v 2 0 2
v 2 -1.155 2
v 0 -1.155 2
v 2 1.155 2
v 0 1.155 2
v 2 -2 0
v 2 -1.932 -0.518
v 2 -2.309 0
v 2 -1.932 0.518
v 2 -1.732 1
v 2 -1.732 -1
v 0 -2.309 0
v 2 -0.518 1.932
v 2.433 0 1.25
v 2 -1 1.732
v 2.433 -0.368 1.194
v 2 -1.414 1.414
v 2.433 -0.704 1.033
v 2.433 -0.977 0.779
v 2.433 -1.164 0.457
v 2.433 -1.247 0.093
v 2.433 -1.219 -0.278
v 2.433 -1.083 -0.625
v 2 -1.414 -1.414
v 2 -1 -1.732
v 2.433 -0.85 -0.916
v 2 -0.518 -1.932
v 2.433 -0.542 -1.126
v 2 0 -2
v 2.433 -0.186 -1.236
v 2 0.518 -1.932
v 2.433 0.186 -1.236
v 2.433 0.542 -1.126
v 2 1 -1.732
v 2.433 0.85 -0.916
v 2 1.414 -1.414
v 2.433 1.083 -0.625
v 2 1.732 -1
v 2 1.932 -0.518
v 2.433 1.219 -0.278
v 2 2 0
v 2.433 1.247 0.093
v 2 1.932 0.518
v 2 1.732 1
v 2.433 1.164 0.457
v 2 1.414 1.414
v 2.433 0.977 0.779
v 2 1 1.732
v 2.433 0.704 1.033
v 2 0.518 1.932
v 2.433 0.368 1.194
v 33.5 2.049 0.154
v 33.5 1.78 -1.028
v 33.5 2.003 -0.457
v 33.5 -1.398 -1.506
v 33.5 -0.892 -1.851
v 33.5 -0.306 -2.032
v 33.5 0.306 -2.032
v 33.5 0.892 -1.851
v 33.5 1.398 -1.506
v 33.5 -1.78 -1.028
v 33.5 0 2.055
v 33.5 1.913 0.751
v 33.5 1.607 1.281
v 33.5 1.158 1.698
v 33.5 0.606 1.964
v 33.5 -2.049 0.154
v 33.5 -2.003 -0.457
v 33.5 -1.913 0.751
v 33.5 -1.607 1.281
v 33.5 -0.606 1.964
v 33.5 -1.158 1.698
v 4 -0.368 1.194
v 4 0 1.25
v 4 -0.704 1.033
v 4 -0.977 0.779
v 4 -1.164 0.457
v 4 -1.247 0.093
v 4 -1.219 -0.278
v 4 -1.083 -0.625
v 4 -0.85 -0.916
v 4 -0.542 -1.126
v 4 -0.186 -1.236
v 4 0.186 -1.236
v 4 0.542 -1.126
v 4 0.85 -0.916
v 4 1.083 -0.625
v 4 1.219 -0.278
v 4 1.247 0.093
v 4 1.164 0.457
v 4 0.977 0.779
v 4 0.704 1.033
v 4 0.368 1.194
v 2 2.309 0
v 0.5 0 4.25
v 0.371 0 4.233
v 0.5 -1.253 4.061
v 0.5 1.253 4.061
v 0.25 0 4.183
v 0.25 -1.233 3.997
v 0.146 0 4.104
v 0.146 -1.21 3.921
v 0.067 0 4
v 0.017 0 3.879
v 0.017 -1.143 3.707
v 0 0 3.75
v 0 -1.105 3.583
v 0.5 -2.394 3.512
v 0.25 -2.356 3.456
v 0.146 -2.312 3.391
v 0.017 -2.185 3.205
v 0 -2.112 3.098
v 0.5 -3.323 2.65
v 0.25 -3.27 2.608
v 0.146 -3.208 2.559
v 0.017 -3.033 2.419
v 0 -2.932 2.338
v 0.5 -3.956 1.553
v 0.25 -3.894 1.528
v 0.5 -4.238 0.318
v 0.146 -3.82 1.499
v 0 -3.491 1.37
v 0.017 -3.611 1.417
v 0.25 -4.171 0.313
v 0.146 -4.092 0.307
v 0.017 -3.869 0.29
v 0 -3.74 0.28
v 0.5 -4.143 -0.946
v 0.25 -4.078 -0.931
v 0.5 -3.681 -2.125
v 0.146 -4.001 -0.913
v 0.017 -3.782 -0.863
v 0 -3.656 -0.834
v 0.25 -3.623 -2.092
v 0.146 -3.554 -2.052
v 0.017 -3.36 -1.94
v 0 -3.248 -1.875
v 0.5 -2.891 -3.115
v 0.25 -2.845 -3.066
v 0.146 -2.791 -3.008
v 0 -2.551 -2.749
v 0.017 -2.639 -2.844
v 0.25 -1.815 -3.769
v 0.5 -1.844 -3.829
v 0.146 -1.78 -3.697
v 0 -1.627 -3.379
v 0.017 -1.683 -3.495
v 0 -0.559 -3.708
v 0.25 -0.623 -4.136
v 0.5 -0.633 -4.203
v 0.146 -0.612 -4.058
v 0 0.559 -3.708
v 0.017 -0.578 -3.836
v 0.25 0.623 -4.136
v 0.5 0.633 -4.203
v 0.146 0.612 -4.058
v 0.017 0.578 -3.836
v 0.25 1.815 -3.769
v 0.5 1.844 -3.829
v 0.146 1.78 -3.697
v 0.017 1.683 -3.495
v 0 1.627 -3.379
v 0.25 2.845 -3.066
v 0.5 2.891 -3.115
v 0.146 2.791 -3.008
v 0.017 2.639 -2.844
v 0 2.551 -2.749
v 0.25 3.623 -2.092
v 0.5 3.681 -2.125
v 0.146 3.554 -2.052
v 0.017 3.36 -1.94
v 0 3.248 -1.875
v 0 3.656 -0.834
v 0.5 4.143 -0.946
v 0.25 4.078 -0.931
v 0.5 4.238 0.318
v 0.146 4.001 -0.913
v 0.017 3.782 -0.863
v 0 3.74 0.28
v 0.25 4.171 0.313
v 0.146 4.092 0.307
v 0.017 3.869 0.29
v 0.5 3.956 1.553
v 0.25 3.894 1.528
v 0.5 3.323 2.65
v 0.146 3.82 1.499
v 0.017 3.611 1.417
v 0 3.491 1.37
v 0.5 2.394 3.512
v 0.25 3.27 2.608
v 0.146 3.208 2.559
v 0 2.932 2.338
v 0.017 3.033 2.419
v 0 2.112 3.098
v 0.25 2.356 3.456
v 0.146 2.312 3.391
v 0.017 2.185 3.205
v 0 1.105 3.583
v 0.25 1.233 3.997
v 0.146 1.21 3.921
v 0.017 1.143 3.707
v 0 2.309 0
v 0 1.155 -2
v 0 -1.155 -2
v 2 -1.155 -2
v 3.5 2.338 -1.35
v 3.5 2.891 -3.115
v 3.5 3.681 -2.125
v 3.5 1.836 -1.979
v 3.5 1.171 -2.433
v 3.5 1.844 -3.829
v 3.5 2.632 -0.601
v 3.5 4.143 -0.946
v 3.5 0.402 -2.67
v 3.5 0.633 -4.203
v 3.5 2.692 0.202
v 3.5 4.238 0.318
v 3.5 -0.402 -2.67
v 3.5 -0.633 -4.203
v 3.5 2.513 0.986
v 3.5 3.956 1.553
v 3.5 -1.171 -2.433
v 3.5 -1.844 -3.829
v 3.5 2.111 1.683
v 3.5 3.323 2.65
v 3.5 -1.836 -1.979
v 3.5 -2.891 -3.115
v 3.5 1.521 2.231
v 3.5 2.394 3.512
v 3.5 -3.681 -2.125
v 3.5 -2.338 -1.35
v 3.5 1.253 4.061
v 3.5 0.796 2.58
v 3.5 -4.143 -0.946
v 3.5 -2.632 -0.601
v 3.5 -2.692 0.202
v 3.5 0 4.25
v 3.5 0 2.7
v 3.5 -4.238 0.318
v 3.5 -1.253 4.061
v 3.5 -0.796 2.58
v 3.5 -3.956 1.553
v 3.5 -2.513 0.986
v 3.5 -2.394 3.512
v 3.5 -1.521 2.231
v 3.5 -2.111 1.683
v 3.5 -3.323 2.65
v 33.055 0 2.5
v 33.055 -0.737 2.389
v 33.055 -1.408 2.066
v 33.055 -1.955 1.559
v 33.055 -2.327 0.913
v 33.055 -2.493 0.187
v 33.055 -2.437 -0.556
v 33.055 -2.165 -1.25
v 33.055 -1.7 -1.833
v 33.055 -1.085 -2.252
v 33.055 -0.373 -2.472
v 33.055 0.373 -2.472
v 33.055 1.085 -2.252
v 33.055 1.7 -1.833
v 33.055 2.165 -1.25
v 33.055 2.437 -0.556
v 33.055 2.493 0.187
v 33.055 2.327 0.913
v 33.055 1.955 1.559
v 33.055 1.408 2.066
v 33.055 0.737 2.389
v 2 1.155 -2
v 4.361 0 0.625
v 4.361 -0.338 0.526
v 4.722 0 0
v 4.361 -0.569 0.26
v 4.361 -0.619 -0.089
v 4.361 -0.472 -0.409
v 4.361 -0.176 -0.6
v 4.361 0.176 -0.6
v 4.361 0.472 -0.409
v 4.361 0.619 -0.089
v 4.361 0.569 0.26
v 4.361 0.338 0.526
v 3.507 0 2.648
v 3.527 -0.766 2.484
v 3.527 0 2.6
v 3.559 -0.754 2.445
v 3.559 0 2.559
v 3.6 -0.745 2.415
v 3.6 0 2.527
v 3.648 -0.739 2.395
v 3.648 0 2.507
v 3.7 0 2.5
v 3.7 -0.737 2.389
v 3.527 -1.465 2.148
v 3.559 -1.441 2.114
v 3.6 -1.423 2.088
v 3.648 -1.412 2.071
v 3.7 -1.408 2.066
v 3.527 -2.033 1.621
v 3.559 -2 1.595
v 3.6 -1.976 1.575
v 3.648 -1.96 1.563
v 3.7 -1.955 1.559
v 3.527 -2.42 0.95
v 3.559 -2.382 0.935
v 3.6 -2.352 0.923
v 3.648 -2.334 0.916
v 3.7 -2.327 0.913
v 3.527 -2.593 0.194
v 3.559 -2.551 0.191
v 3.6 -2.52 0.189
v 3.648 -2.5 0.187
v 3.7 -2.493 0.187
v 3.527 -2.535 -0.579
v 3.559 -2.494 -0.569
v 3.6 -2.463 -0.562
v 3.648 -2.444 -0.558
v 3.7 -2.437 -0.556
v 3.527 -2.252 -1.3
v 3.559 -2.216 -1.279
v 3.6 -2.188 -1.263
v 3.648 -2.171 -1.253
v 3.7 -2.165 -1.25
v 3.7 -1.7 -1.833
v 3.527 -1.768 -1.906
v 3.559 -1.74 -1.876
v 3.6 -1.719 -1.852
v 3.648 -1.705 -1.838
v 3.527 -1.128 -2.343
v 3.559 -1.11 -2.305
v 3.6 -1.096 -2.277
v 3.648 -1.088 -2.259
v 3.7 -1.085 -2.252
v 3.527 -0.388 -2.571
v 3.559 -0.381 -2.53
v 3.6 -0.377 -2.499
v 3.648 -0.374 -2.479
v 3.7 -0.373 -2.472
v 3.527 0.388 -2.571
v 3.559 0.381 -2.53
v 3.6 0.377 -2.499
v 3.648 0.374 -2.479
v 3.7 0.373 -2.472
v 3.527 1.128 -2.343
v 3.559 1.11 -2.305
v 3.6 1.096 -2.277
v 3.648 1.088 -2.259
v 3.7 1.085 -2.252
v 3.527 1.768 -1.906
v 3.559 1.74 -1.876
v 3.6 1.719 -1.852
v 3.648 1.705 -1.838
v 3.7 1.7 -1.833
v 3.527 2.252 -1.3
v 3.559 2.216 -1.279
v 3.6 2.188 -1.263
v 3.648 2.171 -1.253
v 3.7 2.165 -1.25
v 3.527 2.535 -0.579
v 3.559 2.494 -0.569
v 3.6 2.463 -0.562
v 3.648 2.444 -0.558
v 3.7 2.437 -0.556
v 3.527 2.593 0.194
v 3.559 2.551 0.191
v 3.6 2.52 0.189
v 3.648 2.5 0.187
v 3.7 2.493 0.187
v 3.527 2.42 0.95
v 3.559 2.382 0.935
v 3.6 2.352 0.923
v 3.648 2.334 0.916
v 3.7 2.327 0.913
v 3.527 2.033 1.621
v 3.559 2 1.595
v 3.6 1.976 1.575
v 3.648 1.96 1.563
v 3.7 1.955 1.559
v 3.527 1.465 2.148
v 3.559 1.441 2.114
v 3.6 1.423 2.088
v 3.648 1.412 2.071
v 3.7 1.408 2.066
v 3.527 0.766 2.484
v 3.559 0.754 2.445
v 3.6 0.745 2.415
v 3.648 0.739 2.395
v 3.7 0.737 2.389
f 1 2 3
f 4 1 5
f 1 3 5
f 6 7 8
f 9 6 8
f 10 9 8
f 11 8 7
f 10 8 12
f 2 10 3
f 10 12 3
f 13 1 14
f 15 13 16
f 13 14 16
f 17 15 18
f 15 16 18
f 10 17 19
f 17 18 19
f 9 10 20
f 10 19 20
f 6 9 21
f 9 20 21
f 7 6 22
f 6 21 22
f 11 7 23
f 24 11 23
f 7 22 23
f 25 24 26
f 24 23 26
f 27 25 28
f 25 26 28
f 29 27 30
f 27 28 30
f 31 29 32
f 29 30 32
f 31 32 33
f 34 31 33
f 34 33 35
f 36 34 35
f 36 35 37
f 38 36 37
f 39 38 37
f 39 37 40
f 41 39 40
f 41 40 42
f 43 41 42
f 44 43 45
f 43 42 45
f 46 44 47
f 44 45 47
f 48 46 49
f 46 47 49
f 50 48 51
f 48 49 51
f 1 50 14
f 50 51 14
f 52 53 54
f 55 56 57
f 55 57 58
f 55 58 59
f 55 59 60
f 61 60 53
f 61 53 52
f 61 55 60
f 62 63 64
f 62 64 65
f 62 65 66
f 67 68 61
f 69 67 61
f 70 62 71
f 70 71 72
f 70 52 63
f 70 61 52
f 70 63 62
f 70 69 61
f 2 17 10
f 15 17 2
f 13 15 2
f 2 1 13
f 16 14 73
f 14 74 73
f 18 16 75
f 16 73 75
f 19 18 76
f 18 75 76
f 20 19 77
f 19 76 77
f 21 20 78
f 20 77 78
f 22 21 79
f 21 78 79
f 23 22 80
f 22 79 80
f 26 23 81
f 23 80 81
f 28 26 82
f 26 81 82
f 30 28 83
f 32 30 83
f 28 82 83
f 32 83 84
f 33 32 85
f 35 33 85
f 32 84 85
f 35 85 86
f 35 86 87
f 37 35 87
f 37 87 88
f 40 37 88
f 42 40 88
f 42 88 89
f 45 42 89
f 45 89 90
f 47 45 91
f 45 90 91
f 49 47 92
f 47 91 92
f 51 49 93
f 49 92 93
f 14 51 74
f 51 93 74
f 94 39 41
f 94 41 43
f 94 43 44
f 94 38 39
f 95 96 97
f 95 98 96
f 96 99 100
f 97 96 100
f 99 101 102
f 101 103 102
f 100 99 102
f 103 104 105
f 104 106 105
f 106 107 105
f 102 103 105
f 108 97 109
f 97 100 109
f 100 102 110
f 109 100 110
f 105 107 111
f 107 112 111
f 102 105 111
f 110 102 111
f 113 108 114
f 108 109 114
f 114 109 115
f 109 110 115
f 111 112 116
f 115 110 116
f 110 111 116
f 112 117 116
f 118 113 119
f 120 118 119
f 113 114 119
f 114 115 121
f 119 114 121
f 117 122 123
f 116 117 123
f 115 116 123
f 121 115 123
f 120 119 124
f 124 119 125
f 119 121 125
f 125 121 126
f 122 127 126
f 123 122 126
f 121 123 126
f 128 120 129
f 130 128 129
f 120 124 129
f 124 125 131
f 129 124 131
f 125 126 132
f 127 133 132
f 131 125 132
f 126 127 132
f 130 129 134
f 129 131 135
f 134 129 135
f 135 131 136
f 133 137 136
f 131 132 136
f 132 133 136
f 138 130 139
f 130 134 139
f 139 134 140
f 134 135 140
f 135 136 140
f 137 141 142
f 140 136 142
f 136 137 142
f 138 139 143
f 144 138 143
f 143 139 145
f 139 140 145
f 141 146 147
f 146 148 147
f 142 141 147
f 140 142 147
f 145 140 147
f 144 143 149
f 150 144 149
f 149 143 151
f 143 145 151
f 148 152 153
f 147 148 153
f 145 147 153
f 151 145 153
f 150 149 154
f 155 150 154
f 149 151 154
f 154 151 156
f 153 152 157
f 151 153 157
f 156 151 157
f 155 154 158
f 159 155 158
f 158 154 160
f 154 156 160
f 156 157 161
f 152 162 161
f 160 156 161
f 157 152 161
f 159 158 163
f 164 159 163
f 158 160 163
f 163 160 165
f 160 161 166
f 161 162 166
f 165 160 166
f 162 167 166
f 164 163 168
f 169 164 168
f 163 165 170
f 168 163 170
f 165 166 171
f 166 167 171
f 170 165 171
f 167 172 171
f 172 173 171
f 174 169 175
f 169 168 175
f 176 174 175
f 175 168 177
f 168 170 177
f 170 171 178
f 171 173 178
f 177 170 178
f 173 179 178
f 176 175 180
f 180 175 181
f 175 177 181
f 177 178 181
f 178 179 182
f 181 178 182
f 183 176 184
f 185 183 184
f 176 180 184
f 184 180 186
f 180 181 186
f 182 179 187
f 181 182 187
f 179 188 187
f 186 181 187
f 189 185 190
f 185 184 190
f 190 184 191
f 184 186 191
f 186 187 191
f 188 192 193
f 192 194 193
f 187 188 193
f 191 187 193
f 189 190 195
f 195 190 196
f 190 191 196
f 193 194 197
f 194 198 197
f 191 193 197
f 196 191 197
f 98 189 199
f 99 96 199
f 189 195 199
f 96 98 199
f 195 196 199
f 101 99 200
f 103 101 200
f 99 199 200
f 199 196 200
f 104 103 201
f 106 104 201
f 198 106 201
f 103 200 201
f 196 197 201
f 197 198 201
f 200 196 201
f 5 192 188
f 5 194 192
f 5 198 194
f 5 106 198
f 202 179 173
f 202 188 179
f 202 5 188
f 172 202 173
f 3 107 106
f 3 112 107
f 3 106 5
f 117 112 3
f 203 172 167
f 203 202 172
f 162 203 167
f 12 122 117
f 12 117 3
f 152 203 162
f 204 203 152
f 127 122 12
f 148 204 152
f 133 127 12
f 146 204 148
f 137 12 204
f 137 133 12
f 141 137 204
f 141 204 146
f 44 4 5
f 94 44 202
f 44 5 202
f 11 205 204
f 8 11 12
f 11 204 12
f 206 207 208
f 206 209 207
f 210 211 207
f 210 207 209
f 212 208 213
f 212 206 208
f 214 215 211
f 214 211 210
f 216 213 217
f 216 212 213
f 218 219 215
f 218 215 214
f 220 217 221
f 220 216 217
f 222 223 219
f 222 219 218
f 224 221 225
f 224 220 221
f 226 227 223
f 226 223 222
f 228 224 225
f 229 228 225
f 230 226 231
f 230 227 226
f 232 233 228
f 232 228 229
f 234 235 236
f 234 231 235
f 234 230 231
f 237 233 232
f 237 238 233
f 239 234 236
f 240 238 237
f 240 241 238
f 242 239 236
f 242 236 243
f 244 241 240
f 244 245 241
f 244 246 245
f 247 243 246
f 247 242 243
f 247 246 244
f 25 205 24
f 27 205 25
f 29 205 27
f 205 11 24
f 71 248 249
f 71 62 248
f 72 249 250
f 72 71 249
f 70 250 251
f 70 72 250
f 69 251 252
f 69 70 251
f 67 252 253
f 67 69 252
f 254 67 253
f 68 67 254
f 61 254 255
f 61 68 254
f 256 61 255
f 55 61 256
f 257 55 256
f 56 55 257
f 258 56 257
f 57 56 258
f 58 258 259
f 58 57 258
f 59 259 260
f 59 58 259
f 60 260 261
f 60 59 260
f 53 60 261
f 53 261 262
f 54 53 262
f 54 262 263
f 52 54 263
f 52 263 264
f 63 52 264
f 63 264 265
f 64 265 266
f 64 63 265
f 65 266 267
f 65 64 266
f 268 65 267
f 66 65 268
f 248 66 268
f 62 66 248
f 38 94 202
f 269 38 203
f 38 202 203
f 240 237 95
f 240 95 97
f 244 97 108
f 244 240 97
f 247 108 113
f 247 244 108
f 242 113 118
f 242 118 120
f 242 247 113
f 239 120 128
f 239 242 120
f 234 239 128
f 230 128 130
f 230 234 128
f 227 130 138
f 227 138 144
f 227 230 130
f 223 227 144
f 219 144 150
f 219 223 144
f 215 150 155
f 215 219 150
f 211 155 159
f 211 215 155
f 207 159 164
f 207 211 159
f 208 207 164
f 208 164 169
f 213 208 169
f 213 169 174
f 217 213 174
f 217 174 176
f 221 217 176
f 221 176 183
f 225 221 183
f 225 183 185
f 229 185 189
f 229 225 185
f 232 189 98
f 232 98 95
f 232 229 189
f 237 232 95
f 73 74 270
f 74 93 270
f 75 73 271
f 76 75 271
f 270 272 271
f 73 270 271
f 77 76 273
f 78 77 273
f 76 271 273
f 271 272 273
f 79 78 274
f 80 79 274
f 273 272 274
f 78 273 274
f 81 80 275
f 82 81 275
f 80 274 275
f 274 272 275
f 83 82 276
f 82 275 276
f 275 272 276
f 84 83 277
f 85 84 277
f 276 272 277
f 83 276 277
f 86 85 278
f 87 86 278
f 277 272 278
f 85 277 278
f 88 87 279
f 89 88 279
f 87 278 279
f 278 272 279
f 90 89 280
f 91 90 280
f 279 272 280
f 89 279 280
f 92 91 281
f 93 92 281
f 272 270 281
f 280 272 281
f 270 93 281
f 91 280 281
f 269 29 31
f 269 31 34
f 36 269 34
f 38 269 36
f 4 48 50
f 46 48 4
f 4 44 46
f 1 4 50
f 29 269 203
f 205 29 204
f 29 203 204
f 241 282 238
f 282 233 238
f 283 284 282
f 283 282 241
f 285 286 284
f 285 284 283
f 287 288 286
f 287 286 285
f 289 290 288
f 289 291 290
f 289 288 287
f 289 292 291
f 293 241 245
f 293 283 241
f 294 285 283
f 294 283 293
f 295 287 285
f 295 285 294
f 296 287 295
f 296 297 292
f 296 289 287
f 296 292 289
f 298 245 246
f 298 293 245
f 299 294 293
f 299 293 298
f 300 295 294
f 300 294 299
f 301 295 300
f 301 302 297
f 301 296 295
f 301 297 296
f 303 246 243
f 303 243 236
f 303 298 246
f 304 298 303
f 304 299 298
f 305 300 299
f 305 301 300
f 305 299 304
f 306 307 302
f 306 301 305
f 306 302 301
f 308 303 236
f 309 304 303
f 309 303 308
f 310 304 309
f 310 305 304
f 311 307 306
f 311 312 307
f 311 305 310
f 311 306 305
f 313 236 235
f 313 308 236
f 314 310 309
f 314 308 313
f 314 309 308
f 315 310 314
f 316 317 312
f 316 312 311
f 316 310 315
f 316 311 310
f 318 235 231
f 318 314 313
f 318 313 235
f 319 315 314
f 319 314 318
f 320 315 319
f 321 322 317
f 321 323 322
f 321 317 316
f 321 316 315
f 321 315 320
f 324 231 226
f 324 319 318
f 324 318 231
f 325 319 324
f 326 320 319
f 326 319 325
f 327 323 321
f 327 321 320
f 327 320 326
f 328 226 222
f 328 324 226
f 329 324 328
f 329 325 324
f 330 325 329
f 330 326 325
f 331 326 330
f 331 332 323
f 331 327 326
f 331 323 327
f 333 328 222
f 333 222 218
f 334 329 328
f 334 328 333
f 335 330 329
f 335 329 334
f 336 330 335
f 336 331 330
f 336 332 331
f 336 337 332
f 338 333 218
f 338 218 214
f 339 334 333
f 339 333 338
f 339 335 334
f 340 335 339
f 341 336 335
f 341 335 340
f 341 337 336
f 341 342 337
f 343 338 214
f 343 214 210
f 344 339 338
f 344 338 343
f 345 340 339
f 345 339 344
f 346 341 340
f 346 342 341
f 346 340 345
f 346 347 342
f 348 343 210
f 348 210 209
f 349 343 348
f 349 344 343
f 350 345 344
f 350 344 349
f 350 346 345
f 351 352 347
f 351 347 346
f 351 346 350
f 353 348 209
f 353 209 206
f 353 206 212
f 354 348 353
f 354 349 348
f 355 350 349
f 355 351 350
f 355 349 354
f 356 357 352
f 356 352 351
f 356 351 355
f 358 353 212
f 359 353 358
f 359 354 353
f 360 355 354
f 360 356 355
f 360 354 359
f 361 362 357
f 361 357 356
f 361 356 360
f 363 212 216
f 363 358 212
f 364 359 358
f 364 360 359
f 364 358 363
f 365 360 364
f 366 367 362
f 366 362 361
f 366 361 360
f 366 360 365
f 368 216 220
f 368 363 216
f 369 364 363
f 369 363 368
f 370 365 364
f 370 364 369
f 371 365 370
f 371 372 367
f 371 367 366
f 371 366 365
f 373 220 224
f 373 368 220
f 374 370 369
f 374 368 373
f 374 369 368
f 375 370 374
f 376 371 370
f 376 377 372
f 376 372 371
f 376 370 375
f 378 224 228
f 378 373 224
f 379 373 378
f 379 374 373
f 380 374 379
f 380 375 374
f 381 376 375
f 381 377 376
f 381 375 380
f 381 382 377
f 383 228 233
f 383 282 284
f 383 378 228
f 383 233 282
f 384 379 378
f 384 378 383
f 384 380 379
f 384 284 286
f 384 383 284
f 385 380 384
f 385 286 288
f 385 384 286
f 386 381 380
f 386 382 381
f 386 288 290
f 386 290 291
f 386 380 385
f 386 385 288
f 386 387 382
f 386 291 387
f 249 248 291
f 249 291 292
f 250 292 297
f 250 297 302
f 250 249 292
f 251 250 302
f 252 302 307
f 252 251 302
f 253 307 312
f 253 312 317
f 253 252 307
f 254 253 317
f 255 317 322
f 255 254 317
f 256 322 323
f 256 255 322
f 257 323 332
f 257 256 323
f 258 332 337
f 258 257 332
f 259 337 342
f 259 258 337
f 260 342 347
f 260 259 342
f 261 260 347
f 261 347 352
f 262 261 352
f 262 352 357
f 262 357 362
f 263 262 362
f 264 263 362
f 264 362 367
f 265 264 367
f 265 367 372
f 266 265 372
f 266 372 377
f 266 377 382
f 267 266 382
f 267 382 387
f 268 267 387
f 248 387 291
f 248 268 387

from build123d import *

# Parameters (mm, degrees)
FILLET1_R   = 0.2
FILLET2_R   = 0.5
HEX_2_DEPTH = 2


with BuildPart() as part:
    # BodySke → Base-Revolve (revolve)
    with BuildSketch(Plane.XY, mode=Mode.PRIVATE) as base_revolve_sk:
        Polygon((0, 0), (0, 4.25), (3.5, 4.25), (3.5, 2.5), (33.055, 2.5), (33.5, 2.055), (33.5, 0), align=None)
    revolve(base_revolve_sk.sketch.rotate(Axis((-31.75, 0, 0), (1, 0, 0)), 90), axis=Axis((-31.75, 0, 0), (1, 0, 0)))

    # Fillet1
    fillet1_edges = [part.edges().sort_by_distance(p)[0] for p in [
        (3.5, 0, -2.5),
    ]]
    fillet(fillet1_edges, radius=FILLET1_R)

    # Fillet2
    fillet2_edges = [part.edges().sort_by_distance(p)[0] for p in [
        (0, 0, -4.25),
    ]]
    fillet(fillet2_edges, radius=FILLET2_R)

    # HexSke → Hex 2 (cut)
    with BuildSketch(Plane(origin=(0, 0, 0), x_dir=(0, 0.500000000000001, 0.866025403784438), z_dir=(-1, 0, 0))):
        Polygon((1.154700538, 2), (-1.154700538, 2), (-2.309401077, 0), (-1.154700538, -2), (1.154700538, -2), (2.309401077, 0), align=None)
    extrude(amount=-HEX_2_DEPTH, mode=Mode.SUBTRACT)

    # PilotSke → Hex-PreBroach (revolve, cut)
    with BuildSketch(Plane.XY, mode=Mode.PRIVATE) as hex_prebroach_sk:
        Polygon((0, 2), (2, 2), (2.433012702, 1.25), (4, 1.25), (4.721687836, 0), (0, 0), align=None)
    revolve(hex_prebroach_sk.sketch.rotate(Axis((0, 0, 0), (1, 0, 0)), 90), axis=Axis((0, 0, 0), (1, 0, 0)), mode=Mode.SUBTRACT)


solid = part.part
